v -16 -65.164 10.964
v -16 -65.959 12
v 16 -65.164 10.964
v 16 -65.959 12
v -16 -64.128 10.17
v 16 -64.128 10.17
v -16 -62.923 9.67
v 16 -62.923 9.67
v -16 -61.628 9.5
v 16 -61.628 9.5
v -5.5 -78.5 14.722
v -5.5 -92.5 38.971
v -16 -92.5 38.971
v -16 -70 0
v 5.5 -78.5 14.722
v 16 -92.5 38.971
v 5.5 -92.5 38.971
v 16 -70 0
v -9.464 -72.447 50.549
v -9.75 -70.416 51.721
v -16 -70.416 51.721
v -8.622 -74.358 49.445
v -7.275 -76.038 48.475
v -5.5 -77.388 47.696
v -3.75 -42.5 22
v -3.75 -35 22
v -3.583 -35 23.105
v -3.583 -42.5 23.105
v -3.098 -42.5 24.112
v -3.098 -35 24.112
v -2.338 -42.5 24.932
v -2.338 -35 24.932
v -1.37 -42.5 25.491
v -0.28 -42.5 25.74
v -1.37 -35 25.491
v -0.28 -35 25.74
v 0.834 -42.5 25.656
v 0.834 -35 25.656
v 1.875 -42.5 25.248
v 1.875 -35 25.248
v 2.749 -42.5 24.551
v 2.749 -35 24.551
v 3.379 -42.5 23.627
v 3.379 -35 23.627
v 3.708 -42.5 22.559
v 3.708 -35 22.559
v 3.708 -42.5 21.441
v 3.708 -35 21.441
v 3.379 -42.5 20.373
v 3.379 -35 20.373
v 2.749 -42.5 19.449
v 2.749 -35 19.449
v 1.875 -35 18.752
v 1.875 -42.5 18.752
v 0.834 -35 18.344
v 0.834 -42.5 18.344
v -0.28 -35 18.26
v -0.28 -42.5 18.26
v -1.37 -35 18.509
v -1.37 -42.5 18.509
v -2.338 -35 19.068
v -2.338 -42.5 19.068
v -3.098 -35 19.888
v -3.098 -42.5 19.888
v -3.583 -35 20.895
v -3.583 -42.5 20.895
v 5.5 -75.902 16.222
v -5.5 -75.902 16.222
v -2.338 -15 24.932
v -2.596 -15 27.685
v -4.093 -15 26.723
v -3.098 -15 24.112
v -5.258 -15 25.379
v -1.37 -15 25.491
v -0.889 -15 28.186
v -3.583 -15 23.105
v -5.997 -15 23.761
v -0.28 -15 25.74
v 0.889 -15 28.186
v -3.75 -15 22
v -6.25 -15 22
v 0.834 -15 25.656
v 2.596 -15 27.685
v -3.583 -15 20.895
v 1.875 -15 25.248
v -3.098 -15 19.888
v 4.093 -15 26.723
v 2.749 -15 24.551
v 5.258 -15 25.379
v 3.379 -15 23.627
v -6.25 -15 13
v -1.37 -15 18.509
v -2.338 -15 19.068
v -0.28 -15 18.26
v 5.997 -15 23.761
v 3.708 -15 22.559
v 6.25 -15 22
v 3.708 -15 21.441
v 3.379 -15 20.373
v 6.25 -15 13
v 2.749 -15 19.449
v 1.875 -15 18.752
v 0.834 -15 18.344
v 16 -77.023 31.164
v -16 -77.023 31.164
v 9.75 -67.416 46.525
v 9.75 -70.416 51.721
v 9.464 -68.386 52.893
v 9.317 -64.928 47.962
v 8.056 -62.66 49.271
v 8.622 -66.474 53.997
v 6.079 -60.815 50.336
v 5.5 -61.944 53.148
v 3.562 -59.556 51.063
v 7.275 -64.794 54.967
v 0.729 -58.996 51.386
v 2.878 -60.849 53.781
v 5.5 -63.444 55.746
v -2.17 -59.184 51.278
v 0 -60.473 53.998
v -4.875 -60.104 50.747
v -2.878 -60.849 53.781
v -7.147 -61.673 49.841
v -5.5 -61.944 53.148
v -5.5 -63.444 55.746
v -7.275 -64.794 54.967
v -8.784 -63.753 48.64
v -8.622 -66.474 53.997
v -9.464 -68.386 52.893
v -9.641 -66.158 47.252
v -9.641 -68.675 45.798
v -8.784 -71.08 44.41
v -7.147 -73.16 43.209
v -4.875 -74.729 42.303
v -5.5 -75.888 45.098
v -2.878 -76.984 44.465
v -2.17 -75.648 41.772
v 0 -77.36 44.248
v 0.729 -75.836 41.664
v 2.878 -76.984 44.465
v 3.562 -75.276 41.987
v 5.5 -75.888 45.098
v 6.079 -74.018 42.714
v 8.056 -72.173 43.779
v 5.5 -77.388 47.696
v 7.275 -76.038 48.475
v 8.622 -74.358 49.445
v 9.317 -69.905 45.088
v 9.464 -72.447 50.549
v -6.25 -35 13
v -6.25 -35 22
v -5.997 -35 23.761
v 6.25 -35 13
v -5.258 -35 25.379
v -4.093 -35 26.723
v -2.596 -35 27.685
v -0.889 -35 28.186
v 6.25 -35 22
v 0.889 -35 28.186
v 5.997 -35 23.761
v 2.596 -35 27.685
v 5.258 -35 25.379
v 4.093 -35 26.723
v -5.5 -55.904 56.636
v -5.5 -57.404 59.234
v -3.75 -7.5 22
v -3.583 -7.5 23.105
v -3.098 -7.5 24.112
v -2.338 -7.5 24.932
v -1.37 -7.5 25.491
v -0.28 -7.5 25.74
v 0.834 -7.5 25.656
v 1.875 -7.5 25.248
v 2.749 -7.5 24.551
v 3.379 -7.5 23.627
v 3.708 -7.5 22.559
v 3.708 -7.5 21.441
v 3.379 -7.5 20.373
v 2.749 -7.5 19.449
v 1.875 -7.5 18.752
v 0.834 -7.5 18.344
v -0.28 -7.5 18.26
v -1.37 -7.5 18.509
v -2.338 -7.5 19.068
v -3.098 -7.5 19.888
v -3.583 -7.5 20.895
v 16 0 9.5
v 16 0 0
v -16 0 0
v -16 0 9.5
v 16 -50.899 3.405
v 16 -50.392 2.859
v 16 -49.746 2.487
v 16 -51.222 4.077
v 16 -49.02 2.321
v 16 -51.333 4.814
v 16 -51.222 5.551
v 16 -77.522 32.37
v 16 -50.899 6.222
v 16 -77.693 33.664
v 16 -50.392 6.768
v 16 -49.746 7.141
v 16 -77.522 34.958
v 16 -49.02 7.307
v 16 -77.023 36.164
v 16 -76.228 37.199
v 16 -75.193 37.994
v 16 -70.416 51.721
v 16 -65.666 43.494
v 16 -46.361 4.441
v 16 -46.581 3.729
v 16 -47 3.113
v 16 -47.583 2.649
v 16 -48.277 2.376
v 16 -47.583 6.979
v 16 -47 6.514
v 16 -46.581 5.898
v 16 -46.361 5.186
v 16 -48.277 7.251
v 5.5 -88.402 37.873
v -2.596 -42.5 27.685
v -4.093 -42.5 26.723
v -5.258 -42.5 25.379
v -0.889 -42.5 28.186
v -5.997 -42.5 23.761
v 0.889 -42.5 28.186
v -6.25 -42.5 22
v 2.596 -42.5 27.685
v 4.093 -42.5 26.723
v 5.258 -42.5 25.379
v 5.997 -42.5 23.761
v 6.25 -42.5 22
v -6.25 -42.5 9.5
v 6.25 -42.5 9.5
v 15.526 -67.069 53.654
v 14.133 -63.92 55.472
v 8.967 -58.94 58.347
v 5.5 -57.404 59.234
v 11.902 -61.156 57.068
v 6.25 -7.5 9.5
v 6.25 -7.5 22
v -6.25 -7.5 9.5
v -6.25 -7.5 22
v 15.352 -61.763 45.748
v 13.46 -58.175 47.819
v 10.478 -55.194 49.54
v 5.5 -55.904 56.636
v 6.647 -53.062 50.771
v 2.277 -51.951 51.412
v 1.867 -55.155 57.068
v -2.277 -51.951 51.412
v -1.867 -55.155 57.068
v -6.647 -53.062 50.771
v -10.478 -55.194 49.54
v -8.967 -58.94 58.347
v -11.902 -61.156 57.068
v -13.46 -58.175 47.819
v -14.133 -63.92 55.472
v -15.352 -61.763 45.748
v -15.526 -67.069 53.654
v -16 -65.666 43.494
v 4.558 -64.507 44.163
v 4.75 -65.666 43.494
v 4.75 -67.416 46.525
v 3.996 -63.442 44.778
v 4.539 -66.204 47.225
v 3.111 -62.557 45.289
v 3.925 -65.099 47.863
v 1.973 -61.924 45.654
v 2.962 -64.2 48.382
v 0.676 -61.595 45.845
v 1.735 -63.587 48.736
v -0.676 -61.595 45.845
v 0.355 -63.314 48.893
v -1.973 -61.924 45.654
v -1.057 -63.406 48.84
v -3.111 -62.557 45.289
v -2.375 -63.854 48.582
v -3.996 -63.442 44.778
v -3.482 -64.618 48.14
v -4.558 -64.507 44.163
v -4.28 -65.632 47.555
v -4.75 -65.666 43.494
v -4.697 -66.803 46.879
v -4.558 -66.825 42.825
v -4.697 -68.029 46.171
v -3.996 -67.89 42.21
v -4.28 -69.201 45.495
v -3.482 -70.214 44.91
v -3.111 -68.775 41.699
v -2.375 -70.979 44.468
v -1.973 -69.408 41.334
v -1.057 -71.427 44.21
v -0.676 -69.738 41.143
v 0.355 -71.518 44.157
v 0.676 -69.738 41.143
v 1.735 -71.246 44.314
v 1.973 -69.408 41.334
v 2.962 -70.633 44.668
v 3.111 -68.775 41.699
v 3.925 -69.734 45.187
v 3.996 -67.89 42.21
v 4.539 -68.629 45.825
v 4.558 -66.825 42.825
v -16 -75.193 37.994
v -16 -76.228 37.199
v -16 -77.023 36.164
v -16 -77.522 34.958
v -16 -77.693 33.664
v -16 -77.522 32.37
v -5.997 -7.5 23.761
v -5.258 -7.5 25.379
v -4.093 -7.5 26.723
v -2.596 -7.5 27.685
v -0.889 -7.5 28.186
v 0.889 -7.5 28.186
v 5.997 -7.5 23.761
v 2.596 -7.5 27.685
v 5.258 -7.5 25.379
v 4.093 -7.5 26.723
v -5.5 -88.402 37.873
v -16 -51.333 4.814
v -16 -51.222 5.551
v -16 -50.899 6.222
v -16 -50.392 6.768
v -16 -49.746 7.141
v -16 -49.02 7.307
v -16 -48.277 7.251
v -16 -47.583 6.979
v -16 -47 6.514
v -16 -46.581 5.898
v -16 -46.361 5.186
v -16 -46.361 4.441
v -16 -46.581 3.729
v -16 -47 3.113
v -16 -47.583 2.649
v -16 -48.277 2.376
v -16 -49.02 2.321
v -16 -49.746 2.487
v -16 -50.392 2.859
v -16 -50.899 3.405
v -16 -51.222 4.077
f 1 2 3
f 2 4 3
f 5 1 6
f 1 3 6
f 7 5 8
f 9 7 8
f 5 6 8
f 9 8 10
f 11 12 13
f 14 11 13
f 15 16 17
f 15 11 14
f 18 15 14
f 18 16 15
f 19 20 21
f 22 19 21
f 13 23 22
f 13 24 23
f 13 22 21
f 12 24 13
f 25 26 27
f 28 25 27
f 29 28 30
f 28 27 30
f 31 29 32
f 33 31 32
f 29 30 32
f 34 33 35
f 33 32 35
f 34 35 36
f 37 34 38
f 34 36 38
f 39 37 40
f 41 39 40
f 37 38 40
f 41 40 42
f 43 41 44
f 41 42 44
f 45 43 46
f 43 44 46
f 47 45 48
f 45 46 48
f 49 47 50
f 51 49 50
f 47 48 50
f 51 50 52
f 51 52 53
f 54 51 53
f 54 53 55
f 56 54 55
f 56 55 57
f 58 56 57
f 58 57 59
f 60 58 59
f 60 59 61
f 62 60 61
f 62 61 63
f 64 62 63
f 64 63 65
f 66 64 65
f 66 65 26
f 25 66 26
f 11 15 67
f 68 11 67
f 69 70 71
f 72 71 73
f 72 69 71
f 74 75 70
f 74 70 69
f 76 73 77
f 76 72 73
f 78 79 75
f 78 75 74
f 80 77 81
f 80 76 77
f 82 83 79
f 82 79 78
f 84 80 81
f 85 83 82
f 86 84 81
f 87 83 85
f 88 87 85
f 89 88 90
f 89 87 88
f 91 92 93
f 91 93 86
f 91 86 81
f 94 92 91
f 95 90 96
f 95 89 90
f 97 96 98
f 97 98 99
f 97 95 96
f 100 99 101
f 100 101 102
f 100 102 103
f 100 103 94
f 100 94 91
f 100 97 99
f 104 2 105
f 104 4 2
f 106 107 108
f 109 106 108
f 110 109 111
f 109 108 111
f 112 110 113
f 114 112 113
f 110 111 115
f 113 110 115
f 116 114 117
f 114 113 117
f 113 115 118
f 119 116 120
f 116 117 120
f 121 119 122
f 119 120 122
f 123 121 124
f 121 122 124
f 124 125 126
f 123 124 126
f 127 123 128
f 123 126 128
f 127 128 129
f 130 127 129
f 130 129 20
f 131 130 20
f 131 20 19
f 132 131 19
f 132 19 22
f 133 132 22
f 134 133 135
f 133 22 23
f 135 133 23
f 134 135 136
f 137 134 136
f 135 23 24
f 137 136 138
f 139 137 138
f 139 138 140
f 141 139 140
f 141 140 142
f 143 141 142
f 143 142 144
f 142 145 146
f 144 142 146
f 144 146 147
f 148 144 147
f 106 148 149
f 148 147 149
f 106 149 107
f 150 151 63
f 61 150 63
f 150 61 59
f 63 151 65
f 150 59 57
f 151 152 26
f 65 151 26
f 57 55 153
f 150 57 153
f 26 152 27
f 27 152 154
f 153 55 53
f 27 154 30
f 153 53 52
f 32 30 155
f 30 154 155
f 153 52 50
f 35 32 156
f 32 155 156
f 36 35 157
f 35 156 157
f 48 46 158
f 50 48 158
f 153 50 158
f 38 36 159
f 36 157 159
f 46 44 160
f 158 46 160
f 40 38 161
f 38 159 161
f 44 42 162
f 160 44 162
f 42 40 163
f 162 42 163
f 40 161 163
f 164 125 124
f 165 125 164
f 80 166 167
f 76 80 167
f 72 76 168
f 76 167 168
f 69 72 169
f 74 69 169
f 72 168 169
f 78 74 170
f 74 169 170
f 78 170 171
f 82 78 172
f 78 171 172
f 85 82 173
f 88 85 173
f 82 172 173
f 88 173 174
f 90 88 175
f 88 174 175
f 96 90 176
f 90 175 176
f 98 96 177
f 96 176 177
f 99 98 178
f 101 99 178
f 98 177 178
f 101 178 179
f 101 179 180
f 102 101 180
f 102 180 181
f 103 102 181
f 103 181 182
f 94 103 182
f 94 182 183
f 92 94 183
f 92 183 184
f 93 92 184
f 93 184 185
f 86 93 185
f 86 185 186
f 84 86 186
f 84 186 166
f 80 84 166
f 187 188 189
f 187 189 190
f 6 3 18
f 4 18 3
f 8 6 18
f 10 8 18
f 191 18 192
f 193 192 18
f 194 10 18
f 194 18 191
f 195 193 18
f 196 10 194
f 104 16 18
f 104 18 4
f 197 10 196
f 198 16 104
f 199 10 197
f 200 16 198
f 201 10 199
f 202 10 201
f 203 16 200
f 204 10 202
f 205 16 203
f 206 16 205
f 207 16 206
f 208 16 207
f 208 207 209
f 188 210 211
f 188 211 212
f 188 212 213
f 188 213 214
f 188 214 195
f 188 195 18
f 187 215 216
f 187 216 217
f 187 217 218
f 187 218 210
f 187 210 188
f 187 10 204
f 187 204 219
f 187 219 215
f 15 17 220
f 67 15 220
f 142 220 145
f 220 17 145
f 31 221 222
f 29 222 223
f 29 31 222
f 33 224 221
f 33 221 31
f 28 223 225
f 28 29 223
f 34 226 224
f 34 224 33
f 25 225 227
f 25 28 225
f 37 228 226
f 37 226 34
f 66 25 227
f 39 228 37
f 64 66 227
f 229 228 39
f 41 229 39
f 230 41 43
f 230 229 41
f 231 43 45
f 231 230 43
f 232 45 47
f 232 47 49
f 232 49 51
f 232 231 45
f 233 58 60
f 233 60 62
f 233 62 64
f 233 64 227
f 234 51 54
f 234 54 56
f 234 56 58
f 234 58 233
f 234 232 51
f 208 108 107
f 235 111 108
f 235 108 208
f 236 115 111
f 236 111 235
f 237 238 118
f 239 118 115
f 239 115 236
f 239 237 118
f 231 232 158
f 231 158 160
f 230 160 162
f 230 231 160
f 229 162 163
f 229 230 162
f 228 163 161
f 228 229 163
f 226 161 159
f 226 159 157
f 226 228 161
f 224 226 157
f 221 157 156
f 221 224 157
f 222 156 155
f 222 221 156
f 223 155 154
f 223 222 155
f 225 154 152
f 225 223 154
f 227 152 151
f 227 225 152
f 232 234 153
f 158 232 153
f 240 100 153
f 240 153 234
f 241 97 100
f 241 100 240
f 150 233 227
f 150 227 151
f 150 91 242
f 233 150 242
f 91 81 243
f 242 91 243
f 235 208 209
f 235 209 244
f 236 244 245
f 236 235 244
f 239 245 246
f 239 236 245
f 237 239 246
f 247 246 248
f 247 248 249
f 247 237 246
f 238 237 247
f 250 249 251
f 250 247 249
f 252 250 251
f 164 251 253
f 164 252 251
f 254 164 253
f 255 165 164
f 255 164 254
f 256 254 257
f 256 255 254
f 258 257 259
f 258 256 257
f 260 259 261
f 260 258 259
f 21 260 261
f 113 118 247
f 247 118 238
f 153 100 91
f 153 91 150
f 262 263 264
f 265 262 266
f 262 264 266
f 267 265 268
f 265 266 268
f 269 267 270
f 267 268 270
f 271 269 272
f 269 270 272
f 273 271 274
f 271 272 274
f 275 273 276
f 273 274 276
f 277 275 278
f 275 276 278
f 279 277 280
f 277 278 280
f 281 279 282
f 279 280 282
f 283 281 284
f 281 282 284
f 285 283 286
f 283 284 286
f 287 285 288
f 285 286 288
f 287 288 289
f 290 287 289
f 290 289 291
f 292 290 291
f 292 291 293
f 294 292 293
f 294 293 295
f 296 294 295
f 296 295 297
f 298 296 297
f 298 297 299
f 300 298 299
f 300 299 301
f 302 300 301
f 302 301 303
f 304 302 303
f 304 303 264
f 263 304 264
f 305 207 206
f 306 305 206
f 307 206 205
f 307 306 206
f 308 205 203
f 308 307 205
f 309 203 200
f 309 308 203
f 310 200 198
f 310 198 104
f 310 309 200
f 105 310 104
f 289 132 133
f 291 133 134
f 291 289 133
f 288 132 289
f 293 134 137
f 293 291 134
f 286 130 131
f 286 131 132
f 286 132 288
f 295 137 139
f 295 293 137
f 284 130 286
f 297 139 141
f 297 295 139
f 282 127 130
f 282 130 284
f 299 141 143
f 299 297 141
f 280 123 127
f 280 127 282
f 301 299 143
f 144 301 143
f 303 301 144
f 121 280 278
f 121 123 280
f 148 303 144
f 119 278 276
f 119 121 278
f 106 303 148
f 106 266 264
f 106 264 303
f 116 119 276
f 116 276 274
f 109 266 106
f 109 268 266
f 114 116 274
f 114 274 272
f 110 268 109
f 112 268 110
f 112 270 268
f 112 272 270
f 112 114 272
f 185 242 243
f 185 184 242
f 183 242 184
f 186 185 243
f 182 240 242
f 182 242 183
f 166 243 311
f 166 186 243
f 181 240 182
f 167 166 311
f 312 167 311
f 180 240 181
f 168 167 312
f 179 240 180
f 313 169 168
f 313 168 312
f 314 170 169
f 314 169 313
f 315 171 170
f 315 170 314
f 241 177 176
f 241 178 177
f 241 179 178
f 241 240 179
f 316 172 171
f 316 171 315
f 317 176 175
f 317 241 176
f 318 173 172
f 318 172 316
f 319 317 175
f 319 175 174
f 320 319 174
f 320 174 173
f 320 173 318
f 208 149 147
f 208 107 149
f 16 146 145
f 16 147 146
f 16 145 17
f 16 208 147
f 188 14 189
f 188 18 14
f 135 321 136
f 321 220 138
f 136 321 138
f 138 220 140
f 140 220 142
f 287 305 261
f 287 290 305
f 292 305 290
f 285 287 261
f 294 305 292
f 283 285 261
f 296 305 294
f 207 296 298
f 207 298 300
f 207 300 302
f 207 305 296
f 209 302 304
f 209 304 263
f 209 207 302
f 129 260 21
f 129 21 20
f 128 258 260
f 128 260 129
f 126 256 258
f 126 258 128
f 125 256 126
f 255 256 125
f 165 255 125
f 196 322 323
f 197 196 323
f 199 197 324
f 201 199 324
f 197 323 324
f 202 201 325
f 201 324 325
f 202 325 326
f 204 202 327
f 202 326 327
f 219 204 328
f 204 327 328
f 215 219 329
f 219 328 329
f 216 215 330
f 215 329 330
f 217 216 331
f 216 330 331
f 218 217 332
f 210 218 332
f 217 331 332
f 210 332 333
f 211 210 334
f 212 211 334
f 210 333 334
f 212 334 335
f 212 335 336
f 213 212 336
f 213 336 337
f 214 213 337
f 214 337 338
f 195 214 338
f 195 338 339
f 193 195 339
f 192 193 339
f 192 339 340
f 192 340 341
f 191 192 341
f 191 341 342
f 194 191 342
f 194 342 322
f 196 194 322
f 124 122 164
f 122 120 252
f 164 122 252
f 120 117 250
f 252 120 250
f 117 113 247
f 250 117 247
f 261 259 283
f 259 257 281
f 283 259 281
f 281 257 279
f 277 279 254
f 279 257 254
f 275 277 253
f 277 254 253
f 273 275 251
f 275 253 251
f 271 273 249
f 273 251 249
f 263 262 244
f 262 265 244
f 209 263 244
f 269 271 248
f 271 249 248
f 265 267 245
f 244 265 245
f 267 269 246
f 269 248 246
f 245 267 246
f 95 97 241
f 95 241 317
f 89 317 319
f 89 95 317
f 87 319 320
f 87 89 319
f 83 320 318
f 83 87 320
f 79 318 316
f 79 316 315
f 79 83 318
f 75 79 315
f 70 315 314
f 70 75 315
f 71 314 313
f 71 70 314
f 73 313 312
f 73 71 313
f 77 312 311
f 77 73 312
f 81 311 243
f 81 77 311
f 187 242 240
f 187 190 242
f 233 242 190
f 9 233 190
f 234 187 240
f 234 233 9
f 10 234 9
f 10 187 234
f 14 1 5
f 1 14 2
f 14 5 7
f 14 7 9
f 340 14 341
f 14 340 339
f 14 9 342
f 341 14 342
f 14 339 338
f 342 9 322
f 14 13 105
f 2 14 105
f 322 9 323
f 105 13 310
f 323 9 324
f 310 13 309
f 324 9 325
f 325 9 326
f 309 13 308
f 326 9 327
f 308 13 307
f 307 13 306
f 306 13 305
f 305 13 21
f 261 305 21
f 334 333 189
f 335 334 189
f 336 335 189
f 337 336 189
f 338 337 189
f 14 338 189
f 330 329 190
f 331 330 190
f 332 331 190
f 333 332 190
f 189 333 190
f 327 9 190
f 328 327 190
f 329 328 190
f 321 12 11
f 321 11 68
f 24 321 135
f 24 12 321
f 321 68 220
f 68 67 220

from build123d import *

# Parameters (mm, degrees)
F1_DEPTH  = 32
F2_R      = 32
F3_DEPTH  = 19
F4_R      = 9.5
F5_DEPTH  = 19
F6_R      = 19.5
F6_R_2    = 9.5
F7_DEPTH  = 12
F9_DEPTH  = 11
F10_R     = 10
F12_DEPTH = 12.5
F13_R     = 12.5
F14_DEPTH = 15
F15_R     = 12.5
F16_DEPTH = 15
F17_R     = 7.5
F18_DEPTH = 70
F20_D     = 10
F21_SCALE = 0.5


with BuildPart() as f1:
    # F0 (on Right) → F1 (new body, symmetric)
    with BuildSketch(Plane.YZ):
        Polygon((-140, 0), (0, 0), (0, 19), (-129.0303448854, 19), (-159.0455173281, 70.9878036687), (-131.332704407, 86.9878036687), (-140.832704407, 103.4422863406), (-185, 77.9422863406), align=None)
    extrude(amount=F1_DEPTH, both=True)

    # F2 (on face) → F3 (join, through all)
    with BuildSketch(Plane(origin=(0, -80, 138.5640646055), x_dir=(1, 0, 0), z_dir=(0, -0.5, 0.8660254038))):
        with Locations((0, -70.2435565298)):
            Circle(F2_R)
    extrude(amount=-F3_DEPTH)

    # F4 (on face) → F5 (cut, through all)
    with BuildSketch(Plane(origin=(0, -80, 138.5640646055), x_dir=(1, 0, 0), z_dir=(0, -0.5, 0.8660254038))):
        with Locations((0, -70.2435565298)):
            Circle(F4_R)
    extrude(amount=-F5_DEPTH, mode=Mode.SUBTRACT)

    # F6 (on face) → F7 (cut)
    with BuildSketch(Plane(origin=(0, -80, 138.5640646055), x_dir=(1, 0, 0), z_dir=(0, -0.5, 0.8660254038))):
        with Locations((0, -70.2435565298)):
            Circle(F6_R)
        with Locations((0, -70.2435565298)):
            Circle(F6_R_2, mode=Mode.SUBTRACT)
    extrude(amount=-F7_DEPTH, mode=Mode.SUBTRACT)

    # F8 (on Right) → F9 (cut, symmetric)
    with BuildSketch(Plane.YZ):
        Polygon((-176.8038475773, 75.7461339179), (-102.4204401346, 118.6914142282), (-139.8535072803, 145.4511135817), (-219.7459042072, 72.3169818521), (-158.4675441277, 28.5975767315), (-151.8038475773, 32.4448637287), align=None)
    extrude(amount=F9_DEPTH, both=True, mode=Mode.SUBTRACT)

    # F10
    f10_edges = [f1.edges().sort_by_distance(p)[0] for p in [
        (0, -159.045517, 70.987804),
        (0, -129.030345, 19),
    ]]
    fillet(f10_edges, radius=F10_R)

    # F11 (on Right) → F12 (join, symmetric)
    with BuildSketch(Plane.YZ):
        Polygon((-85, 44), (-85, 19), (-15, 19), (-15, 44), (-30, 44), (-30, 26), (-70, 26), (-70, 44), align=None)
    extrude(amount=F12_DEPTH, both=True)

    # F13 (on face) → F14 (join, through all)
    with BuildSketch(Plane.XZ.offset(85)):
        with Locations((0, 44)):
            Circle(F13_R)
    extrude(amount=-F14_DEPTH)

    # F15 (on face) → F16 (join, through all)
    with BuildSketch(Plane.XZ.offset(30)):
        with Locations((0, 44)):
            Circle(F15_R)
    extrude(amount=-F16_DEPTH)

    # F17 (on face) → F18 (cut, through all)
    with BuildSketch(Plane(origin=(0, -15, 0), x_dir=(-1, 0, 0), z_dir=(0, 1, 0))):
        with Locations((0, 44)):
            Circle(F17_R)
    extrude(amount=-F18_DEPTH, mode=Mode.SUBTRACT)

    # F20 (through all)
    with Locations(Plane.YZ.offset(32)):
        with Locations((-97.6659357548, 9.6274418756)):
            Hole(F20_D / 2)


with BuildPart() as f1_1:
    # F21: moved
    add(f1.part.scale(F21_SCALE))


solid = f1_1.part
